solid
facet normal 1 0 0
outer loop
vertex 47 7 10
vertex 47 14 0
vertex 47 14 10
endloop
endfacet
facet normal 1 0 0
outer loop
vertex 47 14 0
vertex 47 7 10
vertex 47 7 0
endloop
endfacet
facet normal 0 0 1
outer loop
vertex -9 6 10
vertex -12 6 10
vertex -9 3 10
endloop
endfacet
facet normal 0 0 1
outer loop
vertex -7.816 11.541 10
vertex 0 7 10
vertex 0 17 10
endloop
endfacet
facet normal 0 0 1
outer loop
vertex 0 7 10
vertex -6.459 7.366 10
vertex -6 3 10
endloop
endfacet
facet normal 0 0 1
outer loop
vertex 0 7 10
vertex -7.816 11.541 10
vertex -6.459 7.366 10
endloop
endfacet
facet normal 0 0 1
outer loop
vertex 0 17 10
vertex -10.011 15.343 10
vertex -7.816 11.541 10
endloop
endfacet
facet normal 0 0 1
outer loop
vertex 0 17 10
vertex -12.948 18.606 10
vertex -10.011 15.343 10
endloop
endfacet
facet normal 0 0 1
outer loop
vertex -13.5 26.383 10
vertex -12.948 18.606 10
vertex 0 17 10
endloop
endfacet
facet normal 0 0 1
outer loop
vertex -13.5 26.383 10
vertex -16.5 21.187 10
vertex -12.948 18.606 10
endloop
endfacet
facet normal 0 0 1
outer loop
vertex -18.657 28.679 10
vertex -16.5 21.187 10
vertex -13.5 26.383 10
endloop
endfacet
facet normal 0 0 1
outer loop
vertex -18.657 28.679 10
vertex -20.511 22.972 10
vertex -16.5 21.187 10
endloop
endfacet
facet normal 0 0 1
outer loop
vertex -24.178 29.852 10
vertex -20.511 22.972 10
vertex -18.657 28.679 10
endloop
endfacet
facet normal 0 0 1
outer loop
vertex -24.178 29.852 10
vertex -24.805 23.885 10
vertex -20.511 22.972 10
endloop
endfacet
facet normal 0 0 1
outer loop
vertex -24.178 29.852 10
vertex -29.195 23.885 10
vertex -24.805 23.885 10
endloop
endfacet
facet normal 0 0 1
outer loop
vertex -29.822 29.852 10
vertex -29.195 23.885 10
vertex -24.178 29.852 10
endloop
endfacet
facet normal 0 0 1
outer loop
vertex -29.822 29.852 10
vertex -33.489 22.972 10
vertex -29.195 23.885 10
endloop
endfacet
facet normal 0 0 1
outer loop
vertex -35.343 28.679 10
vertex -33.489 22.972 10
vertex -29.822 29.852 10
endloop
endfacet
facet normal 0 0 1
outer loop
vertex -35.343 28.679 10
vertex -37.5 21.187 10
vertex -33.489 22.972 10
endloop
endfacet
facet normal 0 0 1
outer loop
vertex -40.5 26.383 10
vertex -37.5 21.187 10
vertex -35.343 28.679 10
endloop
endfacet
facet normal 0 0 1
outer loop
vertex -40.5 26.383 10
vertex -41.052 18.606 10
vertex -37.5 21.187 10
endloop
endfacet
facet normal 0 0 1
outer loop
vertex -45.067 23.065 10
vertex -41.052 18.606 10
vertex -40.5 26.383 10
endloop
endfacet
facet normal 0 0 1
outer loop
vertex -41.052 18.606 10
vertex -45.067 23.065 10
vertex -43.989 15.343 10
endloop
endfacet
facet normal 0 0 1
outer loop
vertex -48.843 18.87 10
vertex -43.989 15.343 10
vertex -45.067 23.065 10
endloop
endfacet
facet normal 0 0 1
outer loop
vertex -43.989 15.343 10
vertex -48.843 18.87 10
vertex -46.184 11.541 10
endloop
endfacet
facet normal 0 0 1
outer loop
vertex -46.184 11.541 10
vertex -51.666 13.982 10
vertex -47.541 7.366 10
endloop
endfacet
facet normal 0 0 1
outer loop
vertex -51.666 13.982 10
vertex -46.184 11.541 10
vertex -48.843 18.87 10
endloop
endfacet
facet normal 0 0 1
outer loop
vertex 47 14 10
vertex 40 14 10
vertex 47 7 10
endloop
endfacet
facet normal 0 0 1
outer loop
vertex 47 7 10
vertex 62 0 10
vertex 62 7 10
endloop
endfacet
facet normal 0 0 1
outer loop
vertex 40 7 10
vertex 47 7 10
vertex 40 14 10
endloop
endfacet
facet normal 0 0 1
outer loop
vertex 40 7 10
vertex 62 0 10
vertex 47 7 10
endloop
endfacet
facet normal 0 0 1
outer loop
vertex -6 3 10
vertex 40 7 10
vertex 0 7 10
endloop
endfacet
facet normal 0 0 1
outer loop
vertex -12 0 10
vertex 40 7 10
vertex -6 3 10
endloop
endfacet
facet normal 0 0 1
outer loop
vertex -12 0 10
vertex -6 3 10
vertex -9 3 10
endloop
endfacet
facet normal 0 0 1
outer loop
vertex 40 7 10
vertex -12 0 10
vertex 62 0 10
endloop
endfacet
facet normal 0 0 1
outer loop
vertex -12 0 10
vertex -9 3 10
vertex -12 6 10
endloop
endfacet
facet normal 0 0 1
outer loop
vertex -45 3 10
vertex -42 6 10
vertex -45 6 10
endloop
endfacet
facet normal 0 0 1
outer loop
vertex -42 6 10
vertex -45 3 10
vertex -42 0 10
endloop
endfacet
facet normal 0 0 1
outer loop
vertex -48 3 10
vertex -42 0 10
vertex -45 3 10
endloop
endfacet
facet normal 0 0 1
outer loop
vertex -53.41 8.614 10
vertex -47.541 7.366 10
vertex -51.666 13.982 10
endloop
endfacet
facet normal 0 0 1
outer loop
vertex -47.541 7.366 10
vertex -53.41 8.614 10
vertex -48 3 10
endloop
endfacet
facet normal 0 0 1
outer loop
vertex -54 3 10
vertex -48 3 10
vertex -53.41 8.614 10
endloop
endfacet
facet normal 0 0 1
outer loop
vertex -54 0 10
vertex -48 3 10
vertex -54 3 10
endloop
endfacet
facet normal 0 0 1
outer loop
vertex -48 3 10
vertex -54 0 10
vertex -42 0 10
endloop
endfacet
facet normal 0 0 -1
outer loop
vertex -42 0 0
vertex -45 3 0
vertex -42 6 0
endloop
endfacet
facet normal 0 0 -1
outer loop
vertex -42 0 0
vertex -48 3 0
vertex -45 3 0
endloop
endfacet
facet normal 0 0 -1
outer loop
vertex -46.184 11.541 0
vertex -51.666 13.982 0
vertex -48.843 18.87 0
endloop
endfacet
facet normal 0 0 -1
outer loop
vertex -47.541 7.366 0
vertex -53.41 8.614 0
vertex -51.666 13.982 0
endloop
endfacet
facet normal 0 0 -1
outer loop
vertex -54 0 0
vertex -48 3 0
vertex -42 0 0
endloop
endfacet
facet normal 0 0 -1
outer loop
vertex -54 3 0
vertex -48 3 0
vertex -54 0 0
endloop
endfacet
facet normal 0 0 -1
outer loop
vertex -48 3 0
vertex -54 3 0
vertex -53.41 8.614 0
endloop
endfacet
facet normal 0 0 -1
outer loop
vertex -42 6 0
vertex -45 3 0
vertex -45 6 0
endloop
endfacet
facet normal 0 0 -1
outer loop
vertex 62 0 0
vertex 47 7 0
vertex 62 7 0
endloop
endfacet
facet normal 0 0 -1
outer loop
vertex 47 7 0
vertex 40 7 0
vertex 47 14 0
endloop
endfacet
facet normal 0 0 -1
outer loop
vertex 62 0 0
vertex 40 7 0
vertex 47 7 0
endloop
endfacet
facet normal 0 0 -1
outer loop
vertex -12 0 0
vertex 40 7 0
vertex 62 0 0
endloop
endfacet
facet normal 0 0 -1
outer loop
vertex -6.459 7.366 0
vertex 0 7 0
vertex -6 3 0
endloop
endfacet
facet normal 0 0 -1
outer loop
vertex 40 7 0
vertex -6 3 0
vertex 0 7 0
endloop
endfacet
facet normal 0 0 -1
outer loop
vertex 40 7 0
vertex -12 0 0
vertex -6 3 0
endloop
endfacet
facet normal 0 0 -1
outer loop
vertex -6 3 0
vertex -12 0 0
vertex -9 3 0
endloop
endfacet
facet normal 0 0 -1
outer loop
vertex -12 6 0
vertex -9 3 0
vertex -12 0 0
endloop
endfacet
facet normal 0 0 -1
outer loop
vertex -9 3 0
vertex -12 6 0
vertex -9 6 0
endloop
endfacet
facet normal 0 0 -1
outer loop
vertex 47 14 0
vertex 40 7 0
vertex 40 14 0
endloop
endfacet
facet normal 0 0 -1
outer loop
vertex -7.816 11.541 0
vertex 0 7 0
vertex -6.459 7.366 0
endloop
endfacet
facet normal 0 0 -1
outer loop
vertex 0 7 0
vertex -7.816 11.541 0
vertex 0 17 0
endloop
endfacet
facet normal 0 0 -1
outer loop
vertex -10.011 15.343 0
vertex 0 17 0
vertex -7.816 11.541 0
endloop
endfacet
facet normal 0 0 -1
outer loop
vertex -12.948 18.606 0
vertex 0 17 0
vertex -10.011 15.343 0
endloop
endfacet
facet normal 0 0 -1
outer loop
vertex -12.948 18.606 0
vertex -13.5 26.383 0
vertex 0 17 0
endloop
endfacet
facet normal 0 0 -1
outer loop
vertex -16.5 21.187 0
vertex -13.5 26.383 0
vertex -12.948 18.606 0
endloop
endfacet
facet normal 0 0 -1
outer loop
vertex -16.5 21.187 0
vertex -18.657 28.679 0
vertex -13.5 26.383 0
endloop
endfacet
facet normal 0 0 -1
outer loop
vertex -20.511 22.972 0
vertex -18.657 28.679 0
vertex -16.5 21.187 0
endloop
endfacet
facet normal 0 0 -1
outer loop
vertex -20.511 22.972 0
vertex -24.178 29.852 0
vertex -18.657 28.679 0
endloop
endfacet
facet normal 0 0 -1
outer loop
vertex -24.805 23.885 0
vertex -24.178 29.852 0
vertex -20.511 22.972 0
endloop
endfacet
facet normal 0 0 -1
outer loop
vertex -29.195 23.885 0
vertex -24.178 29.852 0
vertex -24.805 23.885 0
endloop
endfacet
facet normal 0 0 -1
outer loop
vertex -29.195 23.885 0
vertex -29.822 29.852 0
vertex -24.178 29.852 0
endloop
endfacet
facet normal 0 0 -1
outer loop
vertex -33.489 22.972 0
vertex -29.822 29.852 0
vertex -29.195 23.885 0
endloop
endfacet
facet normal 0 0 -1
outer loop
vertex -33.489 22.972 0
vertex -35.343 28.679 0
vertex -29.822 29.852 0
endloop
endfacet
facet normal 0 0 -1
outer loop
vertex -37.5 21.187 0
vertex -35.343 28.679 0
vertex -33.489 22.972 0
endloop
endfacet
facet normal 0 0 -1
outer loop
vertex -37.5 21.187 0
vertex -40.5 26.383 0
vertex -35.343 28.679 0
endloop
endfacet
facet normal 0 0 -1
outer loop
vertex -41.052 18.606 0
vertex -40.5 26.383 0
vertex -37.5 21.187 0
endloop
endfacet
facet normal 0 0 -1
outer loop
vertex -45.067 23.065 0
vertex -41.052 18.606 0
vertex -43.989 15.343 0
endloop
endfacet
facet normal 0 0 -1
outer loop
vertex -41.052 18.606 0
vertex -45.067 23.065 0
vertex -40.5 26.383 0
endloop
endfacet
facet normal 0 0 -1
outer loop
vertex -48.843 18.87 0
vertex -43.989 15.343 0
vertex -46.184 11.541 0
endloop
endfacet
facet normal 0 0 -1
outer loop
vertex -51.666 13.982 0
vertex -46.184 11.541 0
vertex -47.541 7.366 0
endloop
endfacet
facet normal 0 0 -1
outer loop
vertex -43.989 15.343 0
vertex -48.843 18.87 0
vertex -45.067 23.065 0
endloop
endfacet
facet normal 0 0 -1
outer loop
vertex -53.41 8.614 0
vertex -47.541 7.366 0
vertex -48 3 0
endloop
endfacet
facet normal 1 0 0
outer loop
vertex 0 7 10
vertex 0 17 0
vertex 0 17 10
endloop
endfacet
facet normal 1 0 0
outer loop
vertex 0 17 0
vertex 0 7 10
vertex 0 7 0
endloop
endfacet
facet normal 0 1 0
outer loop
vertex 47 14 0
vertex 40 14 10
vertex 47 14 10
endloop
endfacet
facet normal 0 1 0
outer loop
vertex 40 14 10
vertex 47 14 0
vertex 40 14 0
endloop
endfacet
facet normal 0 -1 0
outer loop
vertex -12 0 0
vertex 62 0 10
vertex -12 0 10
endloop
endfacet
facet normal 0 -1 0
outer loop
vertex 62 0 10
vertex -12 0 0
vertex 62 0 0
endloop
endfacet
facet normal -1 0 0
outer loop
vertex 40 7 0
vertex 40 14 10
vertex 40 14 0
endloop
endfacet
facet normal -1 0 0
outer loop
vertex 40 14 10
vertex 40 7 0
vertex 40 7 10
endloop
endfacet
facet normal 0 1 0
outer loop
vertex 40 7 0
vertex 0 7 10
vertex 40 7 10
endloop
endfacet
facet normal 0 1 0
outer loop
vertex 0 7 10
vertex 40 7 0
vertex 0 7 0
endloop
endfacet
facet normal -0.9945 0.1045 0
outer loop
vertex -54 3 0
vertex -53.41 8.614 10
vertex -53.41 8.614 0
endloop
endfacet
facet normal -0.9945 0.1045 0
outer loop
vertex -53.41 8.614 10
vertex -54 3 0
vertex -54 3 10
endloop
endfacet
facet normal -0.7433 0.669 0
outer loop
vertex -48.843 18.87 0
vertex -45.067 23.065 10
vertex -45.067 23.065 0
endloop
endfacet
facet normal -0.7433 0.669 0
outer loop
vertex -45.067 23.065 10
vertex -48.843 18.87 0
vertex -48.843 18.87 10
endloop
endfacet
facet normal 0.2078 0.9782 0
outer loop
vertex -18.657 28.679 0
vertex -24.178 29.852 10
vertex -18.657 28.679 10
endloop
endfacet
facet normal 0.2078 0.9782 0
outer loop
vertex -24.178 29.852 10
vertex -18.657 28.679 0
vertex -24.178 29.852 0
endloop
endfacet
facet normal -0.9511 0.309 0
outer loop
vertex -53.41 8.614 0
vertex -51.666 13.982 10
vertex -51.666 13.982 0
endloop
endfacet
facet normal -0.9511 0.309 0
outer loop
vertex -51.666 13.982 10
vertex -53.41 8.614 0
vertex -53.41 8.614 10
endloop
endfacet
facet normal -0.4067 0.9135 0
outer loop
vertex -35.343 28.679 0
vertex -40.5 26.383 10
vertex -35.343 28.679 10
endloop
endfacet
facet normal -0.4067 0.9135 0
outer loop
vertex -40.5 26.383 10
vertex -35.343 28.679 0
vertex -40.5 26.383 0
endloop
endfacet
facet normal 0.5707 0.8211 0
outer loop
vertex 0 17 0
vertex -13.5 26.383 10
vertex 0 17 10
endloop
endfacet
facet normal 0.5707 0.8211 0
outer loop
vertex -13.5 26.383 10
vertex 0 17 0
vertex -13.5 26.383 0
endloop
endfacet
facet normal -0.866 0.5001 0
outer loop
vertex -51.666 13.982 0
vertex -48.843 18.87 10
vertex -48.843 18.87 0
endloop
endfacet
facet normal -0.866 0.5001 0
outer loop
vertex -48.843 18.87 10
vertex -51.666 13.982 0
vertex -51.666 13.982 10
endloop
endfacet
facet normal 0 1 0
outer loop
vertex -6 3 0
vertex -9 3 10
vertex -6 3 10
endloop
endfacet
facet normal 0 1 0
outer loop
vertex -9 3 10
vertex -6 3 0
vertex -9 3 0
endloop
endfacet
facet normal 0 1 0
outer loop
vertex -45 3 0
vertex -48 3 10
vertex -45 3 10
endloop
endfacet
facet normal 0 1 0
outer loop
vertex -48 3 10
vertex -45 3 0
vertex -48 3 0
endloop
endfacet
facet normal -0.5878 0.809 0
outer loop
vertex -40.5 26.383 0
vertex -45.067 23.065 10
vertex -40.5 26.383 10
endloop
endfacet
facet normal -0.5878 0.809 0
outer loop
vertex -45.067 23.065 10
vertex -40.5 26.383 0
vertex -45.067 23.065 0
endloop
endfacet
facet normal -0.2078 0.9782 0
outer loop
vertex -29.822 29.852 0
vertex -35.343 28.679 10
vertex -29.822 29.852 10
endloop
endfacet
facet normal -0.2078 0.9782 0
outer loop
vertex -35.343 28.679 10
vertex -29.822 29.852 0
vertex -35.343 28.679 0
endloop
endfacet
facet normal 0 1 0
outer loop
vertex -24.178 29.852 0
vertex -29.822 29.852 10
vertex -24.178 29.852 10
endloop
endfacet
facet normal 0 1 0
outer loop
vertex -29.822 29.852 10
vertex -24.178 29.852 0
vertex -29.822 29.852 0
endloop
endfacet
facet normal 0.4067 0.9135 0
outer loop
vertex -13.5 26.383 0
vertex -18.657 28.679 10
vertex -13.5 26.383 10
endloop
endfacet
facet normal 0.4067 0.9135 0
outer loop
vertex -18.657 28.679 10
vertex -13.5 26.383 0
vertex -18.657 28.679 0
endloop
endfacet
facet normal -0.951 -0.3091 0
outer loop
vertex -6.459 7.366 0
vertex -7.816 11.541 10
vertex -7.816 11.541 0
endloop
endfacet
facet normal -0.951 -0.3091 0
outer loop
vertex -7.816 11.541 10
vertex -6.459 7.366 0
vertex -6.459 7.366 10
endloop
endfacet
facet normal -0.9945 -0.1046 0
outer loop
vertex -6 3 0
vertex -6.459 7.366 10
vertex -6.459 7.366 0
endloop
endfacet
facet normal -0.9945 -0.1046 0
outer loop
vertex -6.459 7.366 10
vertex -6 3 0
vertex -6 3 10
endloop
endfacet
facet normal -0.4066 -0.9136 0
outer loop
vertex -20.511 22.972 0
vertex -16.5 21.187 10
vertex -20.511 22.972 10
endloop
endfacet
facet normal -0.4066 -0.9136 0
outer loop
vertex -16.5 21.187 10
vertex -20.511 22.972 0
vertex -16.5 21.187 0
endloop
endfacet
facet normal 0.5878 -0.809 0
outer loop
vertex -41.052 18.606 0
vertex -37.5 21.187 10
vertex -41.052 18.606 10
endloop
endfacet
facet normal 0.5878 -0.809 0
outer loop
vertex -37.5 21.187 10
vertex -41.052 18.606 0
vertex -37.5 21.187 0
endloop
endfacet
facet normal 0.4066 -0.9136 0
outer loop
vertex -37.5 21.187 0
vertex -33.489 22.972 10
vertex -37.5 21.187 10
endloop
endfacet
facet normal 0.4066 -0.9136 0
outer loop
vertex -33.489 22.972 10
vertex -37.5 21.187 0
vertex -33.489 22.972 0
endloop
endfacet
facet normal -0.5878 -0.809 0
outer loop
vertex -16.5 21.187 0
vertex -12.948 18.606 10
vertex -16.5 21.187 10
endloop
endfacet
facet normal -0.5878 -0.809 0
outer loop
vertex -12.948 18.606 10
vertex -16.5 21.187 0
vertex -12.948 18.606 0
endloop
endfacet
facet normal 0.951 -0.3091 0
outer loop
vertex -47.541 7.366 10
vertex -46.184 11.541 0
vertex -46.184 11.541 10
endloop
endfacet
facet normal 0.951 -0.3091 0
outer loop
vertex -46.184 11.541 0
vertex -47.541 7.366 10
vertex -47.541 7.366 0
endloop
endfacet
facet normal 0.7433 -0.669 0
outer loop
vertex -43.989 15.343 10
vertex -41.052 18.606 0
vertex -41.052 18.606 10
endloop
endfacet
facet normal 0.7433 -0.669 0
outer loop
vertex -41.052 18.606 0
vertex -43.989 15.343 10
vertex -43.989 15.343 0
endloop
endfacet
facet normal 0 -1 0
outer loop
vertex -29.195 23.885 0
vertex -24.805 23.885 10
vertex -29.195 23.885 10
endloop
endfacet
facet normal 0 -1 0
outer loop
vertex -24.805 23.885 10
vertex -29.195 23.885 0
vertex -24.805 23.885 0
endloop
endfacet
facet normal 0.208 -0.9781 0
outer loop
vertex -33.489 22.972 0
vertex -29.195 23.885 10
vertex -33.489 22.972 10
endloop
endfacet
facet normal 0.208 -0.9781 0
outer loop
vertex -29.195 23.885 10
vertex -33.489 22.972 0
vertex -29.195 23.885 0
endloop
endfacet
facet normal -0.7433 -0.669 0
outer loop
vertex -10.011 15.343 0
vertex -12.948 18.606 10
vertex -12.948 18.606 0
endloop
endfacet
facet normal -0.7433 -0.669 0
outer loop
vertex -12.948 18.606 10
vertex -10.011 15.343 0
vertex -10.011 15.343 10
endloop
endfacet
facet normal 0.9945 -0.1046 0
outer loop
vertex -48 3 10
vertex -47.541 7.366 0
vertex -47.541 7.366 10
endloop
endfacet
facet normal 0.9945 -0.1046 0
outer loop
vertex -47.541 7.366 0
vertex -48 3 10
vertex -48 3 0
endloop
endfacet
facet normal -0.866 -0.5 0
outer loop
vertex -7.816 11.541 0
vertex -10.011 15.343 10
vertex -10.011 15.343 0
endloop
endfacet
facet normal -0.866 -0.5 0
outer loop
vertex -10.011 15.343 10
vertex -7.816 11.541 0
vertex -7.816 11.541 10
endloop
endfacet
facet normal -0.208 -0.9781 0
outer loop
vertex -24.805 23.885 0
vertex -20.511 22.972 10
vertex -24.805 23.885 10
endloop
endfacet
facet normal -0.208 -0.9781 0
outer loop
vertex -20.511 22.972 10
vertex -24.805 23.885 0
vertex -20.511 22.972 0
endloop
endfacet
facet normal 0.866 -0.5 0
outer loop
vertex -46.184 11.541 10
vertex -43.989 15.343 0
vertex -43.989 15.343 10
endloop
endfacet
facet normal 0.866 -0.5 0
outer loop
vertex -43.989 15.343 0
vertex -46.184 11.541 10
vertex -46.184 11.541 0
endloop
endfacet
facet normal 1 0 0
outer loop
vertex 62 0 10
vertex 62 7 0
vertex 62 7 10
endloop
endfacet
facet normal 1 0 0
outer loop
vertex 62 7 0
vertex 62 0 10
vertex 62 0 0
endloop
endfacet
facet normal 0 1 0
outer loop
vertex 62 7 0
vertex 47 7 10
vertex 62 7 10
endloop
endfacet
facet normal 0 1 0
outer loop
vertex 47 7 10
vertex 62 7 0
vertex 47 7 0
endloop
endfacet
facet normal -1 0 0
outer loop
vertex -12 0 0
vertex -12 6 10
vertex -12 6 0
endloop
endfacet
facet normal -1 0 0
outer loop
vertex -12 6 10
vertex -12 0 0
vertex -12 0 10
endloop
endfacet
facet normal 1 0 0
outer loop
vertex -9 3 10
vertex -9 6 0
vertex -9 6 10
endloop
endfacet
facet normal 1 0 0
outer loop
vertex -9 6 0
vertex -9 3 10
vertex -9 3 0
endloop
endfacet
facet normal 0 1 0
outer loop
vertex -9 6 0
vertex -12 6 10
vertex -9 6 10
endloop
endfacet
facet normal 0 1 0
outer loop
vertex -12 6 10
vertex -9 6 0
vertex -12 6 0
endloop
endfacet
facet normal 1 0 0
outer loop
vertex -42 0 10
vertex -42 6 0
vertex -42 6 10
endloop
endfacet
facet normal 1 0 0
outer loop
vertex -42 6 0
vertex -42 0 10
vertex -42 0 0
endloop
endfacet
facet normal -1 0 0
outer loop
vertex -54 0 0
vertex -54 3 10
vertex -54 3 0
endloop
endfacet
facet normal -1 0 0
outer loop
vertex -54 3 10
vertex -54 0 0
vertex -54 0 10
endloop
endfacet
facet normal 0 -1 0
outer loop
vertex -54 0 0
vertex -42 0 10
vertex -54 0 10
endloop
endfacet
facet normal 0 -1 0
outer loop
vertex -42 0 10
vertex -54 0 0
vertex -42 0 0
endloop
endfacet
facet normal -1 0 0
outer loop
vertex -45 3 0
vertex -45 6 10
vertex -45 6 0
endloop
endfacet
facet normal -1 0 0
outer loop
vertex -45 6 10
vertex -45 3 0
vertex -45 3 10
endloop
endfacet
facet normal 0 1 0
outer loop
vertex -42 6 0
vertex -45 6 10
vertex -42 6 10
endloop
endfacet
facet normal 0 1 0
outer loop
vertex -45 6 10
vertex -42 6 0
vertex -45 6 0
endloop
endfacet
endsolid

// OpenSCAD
down = 3 + 0; //down tube mount
difference () { 
	cube(size = [47,14,10]);
	translate ([0, 7, 0]) cube(size = [40,7,10]);
	}
translate ([47, 0, 0]) cube (size = [15, 7, 10]); 
difference() { 
	hull () { 
		difference() { 
			translate ([-27, down, 0]) cylinder (h = 10, d = 54, center = false);
			translate ([-54, -27 + down, 0]) cube(size = [54,27,10]);
			}
		translate ([-1, down, 0]) cube (size = [1, 14, 10]);
		}
	translate ([-27, down, 0]) cylinder (h = 10, d = 42, center = false);
	}
translate ([-6, 0, 0]) cube (size = [6, down, 10]);
translate ([-12, - 3 + down, 0]) cube (size = [6, 3, 10]);
translate ([-12, - 3 + down, 0]) cube (size = [3, 6, 10]);
translate ([-54, - 3 + down, 0]) cube (size = [12, 3, 10]);
translate ([-45, - 3 + down, 0]) cube (size = [3, 6, 10]);
